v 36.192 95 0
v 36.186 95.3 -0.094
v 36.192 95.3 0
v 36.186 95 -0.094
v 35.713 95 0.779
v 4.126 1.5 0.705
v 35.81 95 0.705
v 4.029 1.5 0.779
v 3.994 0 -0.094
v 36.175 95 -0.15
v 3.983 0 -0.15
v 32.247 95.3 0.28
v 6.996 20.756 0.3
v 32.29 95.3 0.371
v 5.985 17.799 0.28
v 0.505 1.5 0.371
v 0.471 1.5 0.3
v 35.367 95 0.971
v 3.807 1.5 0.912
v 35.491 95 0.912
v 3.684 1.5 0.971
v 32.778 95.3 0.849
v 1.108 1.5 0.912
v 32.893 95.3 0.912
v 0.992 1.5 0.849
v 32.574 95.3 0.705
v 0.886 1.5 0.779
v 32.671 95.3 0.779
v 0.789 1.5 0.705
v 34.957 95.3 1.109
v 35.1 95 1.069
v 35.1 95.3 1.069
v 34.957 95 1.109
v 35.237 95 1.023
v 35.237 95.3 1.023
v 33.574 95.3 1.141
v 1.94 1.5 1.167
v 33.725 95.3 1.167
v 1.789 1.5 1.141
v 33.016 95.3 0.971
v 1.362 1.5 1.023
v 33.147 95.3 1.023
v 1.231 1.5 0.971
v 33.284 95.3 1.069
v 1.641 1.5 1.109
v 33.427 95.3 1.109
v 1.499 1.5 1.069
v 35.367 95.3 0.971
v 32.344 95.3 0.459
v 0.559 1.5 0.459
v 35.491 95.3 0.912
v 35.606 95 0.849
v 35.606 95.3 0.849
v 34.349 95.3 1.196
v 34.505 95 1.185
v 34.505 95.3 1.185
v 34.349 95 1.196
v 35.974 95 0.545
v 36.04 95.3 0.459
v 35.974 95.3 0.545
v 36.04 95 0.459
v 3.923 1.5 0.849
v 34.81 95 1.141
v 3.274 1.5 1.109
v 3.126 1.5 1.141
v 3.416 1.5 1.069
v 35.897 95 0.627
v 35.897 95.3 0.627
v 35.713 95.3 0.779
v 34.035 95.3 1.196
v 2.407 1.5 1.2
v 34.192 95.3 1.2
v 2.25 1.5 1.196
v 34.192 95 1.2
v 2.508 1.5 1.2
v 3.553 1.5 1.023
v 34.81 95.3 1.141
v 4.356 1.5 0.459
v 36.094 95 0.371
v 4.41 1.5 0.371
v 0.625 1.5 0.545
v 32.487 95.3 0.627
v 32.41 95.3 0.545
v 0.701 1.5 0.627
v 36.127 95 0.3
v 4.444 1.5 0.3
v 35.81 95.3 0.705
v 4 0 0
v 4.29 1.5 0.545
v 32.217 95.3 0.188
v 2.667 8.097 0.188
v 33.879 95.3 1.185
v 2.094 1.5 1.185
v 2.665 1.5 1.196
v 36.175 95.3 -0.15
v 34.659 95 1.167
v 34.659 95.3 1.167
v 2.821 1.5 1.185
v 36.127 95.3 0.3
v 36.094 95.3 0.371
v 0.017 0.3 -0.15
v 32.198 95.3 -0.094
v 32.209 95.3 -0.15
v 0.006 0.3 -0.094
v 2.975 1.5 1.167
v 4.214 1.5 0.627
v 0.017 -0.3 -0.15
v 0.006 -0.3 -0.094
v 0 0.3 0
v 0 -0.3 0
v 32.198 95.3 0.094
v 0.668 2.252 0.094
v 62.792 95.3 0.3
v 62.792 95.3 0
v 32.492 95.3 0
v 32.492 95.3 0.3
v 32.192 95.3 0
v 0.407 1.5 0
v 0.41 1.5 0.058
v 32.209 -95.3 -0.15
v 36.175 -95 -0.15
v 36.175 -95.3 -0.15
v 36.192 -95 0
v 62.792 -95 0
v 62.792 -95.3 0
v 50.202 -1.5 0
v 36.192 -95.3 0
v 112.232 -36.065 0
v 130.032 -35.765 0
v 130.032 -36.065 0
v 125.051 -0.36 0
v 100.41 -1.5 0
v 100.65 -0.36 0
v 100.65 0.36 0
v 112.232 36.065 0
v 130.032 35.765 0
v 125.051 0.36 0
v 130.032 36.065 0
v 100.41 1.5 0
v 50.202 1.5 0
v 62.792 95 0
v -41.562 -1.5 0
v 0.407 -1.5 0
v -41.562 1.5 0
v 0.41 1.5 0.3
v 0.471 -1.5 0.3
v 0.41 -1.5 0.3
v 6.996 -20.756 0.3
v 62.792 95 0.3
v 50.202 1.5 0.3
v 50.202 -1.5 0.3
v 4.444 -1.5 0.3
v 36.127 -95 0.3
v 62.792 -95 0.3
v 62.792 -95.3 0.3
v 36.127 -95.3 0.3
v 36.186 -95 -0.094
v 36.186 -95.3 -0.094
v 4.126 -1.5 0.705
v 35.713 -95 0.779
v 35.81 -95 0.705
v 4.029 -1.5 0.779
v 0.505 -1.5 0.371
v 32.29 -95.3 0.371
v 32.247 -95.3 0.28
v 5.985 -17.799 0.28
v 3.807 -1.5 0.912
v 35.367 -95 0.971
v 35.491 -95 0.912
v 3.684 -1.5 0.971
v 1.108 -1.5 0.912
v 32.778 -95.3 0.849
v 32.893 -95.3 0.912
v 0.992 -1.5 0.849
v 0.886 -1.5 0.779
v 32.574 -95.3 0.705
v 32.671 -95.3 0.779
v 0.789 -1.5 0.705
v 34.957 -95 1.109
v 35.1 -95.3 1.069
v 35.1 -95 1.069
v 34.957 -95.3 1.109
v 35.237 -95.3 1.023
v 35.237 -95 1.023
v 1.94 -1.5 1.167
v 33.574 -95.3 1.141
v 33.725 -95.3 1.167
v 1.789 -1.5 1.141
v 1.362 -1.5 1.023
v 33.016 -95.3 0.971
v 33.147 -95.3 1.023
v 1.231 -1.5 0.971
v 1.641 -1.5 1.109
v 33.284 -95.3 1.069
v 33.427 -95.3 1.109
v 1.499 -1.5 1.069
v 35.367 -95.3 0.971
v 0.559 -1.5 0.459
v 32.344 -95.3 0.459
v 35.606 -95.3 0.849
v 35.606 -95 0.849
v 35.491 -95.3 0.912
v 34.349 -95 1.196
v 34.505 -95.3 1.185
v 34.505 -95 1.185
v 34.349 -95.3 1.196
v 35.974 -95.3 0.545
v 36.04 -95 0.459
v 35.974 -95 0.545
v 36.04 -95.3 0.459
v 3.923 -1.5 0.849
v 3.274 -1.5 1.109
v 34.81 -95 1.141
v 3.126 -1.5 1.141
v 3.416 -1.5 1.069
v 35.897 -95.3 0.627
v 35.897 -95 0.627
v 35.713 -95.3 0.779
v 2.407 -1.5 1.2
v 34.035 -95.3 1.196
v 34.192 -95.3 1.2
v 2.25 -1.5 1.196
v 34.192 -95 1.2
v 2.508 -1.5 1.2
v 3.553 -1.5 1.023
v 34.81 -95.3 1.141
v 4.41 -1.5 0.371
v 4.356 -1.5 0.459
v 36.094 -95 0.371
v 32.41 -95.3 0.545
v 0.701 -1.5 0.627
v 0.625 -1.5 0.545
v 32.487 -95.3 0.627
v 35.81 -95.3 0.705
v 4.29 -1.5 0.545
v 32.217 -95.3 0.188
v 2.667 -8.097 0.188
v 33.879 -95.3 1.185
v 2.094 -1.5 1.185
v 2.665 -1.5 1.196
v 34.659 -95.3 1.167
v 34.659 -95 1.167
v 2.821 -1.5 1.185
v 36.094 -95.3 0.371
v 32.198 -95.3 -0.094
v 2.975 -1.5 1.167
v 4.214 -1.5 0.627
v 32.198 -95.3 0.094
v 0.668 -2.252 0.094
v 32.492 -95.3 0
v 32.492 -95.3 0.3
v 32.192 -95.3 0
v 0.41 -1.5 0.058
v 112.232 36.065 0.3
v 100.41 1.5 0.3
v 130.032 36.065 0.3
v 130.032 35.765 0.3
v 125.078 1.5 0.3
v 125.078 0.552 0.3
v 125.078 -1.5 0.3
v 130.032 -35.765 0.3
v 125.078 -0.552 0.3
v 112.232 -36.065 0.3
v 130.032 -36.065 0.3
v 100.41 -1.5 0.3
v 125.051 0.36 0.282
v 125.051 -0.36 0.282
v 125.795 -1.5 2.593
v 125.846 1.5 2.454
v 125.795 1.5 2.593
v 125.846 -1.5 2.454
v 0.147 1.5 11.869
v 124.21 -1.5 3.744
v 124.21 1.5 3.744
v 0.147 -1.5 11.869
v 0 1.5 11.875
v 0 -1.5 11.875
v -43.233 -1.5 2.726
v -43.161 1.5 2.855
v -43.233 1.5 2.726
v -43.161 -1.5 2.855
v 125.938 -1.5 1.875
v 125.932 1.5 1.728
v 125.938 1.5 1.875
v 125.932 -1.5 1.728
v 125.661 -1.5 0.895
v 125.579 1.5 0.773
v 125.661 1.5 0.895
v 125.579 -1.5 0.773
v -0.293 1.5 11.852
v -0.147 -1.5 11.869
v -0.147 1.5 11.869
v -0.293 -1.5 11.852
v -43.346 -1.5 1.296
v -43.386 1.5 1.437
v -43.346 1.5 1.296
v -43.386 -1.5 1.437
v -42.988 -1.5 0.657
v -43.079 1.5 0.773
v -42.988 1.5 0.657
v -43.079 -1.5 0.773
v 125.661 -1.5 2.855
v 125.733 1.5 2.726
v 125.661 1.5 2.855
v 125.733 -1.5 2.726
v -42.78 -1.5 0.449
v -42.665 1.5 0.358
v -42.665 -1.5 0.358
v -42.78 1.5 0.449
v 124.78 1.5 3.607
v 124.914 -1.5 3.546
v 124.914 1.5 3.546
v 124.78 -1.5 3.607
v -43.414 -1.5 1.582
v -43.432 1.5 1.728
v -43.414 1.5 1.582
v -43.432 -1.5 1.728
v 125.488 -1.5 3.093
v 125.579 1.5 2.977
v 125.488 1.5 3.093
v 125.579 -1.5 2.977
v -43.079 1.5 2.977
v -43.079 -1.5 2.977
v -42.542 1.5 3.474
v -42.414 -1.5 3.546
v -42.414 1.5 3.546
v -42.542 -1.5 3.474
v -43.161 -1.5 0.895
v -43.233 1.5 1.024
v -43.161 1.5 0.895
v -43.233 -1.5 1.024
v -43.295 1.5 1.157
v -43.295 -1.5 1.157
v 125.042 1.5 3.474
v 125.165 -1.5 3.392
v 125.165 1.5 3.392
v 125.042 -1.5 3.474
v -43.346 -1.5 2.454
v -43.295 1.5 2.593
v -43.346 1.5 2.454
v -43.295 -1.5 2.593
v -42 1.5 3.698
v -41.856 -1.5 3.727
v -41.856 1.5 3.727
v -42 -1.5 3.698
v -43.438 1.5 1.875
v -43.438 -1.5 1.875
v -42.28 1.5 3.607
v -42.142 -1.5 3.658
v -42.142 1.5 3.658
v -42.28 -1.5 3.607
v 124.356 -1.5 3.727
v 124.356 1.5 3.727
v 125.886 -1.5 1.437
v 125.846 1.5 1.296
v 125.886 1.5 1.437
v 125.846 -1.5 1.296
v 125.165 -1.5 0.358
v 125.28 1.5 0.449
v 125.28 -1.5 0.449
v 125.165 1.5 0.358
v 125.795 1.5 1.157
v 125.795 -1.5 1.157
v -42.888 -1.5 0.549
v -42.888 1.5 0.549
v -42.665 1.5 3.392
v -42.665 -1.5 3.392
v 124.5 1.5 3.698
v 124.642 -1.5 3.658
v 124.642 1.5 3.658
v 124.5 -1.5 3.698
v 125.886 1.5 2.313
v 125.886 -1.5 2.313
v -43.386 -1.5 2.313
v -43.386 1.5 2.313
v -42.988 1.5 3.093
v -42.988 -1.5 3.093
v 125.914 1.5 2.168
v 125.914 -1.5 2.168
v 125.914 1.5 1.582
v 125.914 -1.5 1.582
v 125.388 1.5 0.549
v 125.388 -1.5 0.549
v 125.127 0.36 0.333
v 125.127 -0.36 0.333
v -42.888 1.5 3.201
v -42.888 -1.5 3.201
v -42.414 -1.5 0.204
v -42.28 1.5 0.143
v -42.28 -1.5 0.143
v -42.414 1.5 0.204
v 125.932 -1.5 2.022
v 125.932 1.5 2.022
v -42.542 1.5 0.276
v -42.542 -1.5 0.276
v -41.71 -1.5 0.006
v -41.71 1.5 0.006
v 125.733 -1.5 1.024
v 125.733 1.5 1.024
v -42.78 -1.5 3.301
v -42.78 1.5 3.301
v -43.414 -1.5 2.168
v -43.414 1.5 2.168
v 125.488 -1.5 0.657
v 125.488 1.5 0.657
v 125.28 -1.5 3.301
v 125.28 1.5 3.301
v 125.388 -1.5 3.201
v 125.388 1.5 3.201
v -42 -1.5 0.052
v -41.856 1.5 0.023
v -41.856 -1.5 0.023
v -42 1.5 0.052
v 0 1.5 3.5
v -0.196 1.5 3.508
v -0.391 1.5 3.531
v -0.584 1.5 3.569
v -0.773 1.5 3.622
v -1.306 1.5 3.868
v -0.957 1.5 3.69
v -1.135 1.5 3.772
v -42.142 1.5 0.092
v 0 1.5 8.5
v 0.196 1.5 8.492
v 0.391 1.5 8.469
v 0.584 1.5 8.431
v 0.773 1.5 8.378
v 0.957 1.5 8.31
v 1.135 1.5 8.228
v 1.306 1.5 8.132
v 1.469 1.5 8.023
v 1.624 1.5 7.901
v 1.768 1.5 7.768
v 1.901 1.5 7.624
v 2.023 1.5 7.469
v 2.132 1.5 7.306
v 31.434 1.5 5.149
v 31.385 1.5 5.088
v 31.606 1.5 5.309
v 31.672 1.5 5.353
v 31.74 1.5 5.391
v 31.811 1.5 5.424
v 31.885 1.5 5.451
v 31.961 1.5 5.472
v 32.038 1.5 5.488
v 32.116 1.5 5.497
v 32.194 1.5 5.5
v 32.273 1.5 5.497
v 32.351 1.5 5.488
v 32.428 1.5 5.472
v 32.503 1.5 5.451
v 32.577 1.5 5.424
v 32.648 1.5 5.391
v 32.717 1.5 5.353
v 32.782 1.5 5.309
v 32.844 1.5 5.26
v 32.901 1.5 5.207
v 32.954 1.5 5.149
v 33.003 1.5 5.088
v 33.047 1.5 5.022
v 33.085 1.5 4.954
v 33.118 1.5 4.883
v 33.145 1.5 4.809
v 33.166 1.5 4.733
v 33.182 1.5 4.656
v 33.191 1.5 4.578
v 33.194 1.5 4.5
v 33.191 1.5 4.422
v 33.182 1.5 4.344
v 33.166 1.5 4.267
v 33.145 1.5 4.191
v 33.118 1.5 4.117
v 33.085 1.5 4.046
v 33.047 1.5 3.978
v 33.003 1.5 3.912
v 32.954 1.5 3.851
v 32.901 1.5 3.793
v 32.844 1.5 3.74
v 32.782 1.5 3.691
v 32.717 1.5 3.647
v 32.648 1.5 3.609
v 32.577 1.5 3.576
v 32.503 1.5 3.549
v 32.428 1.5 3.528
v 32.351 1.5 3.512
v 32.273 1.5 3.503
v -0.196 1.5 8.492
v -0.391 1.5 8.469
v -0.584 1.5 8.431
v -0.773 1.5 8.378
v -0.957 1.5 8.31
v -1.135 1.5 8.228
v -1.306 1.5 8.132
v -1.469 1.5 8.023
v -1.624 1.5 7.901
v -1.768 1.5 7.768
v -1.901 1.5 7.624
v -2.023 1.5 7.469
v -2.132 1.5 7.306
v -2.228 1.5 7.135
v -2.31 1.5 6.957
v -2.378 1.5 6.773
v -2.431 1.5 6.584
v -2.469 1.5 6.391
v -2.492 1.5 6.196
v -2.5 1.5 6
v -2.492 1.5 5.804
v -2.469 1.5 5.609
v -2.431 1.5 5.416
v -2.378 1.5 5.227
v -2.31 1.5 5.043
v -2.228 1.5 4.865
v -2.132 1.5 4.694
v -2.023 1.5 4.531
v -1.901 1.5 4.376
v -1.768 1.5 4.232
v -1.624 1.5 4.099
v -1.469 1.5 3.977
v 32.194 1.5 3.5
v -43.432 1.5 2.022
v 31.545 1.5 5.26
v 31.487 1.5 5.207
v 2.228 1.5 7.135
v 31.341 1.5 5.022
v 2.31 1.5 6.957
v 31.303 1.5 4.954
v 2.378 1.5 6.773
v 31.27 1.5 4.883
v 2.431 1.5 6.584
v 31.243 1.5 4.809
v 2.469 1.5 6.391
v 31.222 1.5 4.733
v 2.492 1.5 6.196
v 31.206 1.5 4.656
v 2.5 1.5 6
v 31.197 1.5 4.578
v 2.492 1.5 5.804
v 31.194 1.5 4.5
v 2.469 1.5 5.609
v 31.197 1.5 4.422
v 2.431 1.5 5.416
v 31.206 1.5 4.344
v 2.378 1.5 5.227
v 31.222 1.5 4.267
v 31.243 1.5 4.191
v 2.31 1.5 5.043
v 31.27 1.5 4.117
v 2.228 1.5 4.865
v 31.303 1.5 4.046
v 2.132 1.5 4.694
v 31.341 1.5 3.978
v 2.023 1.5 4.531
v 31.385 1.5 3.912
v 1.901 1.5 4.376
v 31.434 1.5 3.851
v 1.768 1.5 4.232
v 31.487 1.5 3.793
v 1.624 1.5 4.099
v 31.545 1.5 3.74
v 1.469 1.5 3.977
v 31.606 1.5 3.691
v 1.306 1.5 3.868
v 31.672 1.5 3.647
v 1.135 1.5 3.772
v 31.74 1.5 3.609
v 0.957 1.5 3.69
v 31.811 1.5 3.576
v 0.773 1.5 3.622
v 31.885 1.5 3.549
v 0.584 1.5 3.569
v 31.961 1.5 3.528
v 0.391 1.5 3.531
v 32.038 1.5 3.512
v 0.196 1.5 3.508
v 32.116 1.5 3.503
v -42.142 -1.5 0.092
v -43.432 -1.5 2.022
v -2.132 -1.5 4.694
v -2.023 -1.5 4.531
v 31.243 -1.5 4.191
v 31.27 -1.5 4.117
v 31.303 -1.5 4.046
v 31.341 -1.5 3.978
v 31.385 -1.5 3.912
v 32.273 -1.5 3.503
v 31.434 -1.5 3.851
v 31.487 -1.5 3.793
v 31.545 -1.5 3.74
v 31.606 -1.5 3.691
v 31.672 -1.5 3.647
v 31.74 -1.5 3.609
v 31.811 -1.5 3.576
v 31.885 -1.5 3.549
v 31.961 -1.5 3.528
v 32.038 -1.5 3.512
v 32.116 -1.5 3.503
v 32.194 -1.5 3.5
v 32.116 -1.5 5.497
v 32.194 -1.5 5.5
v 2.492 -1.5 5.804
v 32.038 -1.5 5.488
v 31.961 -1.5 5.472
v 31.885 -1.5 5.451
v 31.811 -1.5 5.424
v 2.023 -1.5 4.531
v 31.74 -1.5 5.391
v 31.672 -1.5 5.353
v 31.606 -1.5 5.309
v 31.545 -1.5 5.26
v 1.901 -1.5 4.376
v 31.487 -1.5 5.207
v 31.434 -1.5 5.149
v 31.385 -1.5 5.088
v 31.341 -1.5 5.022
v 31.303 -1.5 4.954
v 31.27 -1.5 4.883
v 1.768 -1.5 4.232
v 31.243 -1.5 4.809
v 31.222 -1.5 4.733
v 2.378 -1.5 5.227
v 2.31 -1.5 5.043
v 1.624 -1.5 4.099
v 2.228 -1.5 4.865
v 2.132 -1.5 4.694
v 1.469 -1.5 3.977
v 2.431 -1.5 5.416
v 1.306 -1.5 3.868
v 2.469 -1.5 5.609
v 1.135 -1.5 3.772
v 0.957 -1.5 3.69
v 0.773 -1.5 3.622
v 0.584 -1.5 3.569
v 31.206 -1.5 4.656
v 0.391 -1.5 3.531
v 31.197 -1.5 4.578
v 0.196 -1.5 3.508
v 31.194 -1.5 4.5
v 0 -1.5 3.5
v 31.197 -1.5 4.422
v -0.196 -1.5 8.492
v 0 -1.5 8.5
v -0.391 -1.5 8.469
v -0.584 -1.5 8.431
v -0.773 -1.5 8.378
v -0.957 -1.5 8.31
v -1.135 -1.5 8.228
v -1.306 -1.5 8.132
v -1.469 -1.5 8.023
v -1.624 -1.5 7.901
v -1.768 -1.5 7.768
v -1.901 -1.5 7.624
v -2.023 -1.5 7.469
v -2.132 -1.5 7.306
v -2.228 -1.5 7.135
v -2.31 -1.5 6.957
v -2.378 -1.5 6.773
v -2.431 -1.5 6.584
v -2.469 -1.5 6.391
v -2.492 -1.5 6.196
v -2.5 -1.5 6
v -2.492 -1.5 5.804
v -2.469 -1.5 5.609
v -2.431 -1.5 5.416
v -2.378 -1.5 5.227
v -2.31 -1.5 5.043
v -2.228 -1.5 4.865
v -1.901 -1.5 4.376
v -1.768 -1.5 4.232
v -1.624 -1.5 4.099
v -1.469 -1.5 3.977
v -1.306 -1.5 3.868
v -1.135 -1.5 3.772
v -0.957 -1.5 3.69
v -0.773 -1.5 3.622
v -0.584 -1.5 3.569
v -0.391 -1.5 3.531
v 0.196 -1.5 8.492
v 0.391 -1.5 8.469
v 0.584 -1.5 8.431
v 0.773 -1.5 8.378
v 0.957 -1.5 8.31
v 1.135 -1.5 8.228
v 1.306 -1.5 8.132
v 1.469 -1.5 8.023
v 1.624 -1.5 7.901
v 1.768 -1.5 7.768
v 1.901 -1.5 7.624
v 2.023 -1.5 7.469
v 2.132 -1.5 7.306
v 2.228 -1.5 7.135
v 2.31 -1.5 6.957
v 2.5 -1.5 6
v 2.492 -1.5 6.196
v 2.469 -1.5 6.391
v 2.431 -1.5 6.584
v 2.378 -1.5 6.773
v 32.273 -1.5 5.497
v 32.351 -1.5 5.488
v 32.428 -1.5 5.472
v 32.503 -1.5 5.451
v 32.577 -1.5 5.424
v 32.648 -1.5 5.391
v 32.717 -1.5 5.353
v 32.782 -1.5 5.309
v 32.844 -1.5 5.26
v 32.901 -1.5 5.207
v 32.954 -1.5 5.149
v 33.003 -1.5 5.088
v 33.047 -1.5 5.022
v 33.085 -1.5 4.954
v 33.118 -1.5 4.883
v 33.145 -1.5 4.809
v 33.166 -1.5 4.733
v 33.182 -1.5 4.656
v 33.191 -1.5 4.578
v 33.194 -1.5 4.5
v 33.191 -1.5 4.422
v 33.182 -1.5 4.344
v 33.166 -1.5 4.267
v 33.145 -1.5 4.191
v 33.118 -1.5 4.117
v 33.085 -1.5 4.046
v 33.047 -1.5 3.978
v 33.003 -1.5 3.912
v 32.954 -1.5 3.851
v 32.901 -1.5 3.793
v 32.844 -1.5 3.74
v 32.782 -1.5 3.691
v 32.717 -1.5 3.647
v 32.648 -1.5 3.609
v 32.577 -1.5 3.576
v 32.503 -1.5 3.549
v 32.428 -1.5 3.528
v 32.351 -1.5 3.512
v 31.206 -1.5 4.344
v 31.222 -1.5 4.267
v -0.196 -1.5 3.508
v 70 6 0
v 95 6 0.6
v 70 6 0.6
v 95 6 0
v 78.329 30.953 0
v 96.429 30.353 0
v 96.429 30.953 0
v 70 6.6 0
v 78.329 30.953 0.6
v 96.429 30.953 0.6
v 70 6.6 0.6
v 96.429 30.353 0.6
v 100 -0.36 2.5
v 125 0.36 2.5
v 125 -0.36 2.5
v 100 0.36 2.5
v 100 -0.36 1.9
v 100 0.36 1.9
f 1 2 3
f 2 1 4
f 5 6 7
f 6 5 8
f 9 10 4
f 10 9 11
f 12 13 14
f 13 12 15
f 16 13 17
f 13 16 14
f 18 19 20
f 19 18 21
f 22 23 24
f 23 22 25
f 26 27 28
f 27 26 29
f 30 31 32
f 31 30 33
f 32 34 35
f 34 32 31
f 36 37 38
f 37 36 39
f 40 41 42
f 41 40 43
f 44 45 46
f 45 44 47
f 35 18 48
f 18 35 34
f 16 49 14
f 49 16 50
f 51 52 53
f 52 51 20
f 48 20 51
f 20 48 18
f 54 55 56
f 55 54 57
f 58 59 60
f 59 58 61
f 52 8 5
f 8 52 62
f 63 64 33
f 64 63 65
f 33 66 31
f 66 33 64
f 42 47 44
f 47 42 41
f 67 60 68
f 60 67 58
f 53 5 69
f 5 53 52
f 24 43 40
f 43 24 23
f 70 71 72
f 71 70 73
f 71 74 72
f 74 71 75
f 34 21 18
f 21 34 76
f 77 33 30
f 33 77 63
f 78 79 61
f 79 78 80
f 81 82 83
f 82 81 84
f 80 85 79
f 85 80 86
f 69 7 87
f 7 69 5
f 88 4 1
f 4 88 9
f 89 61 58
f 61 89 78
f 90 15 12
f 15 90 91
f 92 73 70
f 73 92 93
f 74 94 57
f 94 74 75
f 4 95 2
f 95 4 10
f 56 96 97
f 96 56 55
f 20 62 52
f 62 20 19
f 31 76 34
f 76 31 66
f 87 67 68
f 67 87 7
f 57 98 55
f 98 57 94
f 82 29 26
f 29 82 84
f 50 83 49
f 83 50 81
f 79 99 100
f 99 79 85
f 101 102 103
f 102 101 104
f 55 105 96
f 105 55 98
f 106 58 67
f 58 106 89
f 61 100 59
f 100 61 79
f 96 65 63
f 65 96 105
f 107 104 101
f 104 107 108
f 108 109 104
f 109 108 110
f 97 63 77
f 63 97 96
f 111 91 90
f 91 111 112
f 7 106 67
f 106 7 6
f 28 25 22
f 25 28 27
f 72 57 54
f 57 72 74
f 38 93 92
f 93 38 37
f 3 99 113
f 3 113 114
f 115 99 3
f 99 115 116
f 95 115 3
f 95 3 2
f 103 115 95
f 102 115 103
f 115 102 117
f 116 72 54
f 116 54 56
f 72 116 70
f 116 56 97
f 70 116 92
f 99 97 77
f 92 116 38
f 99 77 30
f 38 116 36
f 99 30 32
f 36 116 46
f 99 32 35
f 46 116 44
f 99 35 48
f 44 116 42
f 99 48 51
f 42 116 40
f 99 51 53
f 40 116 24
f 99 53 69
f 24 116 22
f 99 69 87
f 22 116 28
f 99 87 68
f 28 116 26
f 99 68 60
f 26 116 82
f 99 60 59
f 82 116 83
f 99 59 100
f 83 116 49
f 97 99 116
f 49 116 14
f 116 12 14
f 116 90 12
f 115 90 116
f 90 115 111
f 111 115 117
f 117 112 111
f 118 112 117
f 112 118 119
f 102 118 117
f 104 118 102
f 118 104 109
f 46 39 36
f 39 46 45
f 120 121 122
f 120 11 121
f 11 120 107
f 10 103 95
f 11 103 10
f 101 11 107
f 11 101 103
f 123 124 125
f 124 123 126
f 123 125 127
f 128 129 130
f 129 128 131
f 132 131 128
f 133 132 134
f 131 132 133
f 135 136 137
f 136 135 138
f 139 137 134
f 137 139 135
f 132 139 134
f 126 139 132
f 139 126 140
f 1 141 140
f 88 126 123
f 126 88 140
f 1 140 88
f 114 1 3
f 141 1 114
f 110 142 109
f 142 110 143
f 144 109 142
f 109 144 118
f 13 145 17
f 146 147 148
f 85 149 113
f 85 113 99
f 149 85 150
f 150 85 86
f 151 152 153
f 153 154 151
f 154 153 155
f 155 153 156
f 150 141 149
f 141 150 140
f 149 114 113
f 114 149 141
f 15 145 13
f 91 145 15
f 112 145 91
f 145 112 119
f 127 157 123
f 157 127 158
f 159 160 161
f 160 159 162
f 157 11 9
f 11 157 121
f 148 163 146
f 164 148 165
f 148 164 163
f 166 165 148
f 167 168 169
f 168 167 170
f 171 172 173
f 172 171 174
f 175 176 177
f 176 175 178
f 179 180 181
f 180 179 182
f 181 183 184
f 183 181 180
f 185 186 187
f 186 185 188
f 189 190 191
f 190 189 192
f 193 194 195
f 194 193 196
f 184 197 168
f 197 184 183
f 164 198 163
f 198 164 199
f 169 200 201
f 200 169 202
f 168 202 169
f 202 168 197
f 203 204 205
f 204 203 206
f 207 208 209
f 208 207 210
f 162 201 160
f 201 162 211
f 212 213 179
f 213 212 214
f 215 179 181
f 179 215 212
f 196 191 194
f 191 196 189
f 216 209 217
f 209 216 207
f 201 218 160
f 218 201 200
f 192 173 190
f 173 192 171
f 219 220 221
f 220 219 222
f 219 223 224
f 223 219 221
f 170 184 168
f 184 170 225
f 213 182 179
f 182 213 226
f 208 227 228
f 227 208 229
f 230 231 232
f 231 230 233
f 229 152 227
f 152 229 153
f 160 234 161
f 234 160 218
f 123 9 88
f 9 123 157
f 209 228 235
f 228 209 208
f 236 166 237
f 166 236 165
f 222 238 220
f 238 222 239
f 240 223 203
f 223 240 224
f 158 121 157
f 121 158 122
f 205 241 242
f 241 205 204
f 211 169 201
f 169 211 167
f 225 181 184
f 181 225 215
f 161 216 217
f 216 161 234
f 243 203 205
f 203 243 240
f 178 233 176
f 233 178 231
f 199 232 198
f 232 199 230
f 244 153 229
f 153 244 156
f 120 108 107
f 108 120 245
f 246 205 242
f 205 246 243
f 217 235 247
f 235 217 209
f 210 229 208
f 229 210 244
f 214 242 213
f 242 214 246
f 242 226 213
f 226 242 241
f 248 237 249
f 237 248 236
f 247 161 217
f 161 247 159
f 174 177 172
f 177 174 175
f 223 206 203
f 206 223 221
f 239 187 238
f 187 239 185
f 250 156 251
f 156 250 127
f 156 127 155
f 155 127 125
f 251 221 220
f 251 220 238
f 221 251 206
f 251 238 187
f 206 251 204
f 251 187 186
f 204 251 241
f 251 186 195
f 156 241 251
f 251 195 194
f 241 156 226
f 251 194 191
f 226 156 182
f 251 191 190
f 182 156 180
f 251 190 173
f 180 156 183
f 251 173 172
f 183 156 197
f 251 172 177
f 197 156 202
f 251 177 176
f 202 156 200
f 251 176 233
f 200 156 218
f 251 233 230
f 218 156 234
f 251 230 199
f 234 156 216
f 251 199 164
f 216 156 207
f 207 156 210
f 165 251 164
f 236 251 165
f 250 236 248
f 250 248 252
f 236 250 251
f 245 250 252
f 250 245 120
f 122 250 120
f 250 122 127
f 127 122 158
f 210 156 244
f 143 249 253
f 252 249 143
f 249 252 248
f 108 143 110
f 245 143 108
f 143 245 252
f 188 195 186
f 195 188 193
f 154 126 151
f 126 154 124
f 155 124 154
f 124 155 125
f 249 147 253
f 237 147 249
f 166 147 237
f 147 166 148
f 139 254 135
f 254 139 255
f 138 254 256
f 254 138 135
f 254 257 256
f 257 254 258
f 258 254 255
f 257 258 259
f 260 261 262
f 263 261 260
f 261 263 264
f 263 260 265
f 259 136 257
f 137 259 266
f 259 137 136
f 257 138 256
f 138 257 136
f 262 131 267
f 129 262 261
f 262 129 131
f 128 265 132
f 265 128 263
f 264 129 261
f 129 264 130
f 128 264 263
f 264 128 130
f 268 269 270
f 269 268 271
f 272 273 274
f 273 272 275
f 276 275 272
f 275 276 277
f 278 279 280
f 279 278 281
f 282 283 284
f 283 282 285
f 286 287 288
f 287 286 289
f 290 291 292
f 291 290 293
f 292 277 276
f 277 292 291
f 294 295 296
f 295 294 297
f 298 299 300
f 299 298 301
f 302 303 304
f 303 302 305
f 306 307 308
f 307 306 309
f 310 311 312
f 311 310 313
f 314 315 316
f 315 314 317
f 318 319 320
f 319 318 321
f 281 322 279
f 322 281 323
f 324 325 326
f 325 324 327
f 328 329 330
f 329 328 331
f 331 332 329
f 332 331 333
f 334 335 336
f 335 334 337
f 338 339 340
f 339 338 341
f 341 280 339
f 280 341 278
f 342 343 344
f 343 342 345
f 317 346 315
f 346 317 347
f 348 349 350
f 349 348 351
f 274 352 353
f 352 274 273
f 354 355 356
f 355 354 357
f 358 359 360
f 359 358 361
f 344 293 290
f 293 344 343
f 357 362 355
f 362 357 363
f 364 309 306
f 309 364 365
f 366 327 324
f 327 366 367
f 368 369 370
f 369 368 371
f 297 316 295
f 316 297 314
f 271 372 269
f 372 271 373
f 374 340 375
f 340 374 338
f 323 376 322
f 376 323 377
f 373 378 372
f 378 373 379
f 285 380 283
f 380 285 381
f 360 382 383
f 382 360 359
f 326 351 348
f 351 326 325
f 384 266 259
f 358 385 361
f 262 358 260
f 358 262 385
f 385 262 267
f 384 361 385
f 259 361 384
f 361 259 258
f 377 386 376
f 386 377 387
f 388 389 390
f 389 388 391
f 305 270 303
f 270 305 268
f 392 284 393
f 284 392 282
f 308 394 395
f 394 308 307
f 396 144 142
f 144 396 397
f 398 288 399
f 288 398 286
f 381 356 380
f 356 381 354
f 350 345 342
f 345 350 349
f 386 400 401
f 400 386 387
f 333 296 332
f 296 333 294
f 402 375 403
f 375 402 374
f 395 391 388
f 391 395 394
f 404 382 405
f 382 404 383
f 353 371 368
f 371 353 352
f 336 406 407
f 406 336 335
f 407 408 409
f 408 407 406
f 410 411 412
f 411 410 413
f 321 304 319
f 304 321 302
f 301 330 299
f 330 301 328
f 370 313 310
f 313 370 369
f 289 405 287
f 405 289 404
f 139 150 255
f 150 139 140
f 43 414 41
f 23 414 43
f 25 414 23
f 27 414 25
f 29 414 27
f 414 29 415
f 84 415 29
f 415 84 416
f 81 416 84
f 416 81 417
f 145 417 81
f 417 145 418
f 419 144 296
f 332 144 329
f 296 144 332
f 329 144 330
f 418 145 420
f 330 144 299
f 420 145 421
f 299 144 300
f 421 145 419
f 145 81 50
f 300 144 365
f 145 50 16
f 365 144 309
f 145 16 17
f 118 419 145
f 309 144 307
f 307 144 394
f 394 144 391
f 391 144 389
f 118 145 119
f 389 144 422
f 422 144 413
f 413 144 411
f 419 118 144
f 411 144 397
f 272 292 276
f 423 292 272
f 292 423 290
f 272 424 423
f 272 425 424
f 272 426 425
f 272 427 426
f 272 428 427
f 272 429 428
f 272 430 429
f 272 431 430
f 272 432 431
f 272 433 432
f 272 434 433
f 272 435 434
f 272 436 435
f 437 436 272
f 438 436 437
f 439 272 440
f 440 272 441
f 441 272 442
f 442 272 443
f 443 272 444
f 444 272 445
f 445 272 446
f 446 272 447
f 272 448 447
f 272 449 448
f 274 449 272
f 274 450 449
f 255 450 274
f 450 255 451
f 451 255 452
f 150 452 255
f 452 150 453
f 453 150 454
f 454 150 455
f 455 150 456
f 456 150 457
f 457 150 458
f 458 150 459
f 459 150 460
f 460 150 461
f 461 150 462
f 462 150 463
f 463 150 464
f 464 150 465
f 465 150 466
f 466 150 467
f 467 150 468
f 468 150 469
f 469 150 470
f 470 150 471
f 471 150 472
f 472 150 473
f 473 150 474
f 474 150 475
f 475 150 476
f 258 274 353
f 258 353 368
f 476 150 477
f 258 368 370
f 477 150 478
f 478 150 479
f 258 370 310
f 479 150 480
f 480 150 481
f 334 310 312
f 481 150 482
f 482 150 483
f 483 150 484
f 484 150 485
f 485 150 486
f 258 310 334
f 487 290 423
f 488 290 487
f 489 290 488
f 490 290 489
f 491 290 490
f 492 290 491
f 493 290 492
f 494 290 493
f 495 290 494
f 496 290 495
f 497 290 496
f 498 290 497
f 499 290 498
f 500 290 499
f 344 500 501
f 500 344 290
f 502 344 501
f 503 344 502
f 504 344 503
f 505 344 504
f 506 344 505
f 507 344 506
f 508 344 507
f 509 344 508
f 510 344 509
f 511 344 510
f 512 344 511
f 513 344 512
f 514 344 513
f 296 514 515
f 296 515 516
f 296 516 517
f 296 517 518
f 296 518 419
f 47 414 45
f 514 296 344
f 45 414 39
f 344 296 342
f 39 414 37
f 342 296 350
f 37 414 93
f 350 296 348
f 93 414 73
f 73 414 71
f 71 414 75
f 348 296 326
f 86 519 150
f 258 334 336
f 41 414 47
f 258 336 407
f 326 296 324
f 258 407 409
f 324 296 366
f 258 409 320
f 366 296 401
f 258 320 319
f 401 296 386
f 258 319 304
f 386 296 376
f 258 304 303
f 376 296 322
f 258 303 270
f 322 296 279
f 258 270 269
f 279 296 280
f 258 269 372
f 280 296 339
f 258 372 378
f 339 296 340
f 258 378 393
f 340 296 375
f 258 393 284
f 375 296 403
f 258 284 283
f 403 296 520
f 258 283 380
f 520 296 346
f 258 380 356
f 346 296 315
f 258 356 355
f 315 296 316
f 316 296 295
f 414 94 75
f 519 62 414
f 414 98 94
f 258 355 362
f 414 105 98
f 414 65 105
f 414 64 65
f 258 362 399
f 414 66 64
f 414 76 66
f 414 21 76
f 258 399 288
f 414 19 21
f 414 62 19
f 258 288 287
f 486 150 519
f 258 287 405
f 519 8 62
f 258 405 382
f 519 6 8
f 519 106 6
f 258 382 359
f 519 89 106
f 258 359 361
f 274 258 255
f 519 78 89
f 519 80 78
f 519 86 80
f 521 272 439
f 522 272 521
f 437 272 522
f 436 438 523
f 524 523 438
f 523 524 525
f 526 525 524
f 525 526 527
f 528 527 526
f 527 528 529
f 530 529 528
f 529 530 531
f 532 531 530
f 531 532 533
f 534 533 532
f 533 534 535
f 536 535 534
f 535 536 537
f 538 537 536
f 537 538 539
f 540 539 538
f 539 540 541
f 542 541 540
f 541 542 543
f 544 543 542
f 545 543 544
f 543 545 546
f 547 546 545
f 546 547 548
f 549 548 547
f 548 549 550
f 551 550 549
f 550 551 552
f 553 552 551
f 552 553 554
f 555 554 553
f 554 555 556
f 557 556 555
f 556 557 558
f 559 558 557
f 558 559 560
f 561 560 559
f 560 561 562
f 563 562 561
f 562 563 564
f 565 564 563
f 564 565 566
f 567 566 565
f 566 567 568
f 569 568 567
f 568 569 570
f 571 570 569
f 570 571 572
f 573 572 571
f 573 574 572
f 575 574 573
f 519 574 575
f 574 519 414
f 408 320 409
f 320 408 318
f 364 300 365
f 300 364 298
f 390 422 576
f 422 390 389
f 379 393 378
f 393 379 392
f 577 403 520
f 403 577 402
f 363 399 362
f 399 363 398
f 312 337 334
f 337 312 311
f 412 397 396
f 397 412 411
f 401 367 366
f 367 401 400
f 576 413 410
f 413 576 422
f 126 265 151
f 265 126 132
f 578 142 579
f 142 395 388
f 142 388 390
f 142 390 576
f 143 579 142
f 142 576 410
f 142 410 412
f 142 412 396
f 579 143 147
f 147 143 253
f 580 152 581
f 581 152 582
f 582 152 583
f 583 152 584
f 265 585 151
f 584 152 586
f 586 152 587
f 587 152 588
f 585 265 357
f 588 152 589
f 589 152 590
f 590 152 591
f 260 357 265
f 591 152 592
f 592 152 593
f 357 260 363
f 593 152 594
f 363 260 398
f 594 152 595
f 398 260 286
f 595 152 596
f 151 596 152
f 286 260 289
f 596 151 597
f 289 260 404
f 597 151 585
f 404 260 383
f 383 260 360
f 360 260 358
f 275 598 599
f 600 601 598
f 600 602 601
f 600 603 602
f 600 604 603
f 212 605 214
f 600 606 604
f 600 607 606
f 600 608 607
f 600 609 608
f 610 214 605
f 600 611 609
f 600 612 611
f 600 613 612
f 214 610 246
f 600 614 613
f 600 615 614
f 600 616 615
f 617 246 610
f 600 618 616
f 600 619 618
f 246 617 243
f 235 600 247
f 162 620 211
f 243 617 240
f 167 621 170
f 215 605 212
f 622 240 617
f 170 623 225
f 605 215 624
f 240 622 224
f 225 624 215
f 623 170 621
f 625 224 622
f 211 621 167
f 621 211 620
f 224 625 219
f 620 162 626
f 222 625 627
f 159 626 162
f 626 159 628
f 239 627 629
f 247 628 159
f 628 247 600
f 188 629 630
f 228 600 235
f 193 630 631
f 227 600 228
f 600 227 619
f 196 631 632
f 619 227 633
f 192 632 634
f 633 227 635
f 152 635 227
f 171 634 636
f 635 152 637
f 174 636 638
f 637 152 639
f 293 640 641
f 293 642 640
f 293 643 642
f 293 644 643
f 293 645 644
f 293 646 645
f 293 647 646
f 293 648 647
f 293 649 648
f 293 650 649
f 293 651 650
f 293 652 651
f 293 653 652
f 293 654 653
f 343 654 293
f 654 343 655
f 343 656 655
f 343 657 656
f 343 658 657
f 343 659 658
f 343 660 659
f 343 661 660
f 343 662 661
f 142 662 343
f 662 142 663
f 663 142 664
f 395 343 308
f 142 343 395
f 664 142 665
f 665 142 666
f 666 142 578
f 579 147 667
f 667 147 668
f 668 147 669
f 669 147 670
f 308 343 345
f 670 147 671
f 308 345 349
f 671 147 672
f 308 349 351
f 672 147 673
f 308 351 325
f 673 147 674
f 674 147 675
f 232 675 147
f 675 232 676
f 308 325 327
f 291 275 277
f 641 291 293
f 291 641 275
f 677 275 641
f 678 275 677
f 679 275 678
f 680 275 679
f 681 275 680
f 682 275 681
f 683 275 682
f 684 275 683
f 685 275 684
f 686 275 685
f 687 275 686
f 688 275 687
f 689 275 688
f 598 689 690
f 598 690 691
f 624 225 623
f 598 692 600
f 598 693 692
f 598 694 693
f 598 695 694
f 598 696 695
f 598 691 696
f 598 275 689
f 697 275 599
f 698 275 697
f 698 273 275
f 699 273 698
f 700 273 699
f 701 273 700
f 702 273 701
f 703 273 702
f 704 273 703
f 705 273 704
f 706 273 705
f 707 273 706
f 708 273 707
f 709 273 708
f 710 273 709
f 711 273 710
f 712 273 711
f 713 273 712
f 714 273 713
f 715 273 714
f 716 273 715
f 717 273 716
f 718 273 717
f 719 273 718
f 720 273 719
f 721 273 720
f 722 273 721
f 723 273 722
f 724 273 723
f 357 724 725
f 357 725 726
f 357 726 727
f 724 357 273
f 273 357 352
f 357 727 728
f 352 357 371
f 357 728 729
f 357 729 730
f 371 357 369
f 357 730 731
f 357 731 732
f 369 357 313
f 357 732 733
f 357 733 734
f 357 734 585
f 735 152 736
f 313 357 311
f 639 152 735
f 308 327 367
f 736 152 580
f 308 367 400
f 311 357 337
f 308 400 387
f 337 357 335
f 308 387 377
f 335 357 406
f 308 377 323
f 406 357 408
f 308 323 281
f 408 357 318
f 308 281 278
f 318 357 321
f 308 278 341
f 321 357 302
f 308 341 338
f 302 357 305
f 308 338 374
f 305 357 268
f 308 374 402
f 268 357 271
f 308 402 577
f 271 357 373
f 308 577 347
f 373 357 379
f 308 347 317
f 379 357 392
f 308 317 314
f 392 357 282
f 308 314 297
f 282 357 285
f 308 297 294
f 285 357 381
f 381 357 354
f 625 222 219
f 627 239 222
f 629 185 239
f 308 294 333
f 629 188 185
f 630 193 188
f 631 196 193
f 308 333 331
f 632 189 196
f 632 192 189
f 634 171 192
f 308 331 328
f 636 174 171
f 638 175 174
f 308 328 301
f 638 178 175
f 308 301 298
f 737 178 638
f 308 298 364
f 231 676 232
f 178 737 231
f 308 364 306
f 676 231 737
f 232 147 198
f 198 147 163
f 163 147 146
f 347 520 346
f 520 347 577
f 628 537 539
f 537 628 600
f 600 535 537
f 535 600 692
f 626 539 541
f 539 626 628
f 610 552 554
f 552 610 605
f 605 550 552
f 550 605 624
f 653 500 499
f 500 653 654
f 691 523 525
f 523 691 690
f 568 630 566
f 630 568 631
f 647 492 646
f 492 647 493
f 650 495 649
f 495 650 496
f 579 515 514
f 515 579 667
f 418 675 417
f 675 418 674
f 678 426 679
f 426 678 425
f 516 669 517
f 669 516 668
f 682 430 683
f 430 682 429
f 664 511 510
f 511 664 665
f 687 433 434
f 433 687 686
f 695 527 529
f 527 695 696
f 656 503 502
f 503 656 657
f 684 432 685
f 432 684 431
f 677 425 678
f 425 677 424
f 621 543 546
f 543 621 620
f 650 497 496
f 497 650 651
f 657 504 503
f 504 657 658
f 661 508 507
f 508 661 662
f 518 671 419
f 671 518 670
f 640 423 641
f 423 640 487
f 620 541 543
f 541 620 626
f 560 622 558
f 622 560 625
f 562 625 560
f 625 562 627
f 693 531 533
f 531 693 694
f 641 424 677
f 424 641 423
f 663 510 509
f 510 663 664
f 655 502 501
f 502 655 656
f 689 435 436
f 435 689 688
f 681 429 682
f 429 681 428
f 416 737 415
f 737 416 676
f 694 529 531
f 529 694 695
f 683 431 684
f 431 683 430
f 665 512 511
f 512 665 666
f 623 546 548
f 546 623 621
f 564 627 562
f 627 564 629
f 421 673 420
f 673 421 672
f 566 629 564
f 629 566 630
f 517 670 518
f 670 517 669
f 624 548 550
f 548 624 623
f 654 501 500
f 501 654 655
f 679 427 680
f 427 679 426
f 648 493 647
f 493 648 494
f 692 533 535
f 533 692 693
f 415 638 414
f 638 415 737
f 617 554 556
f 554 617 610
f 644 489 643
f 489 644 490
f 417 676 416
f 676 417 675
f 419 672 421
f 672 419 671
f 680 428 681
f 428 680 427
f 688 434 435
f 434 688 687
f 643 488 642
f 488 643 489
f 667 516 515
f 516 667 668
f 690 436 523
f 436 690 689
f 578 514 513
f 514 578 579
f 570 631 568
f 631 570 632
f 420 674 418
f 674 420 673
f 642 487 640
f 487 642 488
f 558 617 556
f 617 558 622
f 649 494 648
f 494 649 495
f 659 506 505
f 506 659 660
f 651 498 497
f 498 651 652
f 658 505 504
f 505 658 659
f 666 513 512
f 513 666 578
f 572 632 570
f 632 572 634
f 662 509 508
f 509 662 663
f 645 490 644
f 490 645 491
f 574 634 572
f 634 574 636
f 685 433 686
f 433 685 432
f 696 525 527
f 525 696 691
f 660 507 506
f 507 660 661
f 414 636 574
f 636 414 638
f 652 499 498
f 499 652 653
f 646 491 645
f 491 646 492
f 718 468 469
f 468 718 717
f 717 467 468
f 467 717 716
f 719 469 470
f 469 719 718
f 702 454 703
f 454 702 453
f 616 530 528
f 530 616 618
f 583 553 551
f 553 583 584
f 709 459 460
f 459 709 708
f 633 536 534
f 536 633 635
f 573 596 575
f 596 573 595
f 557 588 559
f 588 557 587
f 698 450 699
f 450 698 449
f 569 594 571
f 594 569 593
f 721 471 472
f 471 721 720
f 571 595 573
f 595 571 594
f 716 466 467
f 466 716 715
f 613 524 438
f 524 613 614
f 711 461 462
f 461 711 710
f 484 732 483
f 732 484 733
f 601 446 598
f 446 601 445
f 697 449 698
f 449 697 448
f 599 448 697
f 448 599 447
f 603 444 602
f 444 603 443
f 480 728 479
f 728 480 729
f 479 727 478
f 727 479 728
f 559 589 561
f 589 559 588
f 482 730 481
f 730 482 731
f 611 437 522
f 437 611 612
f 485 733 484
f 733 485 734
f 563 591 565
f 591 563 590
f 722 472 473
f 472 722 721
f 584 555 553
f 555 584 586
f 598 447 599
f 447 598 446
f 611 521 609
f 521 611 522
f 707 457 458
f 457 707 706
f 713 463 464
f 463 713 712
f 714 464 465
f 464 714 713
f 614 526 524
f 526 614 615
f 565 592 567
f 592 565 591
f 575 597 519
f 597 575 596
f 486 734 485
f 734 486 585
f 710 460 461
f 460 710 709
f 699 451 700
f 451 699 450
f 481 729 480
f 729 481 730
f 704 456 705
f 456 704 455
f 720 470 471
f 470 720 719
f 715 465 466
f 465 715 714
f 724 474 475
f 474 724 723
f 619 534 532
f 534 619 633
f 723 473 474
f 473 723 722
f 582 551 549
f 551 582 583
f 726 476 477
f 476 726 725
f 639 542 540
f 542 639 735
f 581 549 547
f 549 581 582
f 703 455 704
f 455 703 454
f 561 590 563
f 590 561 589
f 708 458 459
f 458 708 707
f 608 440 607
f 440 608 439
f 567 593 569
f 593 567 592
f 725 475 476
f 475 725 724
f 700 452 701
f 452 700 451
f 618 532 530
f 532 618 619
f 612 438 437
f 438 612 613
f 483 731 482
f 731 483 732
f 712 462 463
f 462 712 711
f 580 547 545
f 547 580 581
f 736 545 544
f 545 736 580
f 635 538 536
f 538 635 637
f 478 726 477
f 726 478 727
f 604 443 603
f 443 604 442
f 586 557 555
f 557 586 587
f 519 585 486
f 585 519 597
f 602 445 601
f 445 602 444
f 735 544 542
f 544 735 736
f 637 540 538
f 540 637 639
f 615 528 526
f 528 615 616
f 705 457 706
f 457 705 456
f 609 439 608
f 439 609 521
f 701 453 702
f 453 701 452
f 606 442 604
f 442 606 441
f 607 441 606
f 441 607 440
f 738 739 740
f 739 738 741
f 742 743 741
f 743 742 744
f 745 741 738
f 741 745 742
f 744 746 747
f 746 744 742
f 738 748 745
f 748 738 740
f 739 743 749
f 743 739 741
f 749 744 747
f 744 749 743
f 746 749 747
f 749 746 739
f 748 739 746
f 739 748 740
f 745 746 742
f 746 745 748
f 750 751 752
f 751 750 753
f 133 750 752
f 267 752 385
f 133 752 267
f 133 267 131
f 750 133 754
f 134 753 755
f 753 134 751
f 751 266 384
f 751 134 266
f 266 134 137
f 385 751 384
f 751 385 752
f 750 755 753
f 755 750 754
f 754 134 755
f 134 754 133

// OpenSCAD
/*

Jim Gile
Base Model Aircraft Design

-------------------
Calculations from:
https://www.flitetest.com/articles/easy-aircraft-design
https://www.airfieldmodels.com/information_source/math_and_science_of_model_aircraft/formulas/mean_aerodynamic_chord.htm
-------------------
CWL = This value is chosen by the designer. It is the the Cubic Wing Loading (CWL) of the plane.
    Similar aircraft have a range of CWL which dictates their flight abilities:
    0-4 oz/ft^3 = Gliders
    4-7 oz/ft^3 = Trainers
    7-13 oz/ft^3 = Sport/Aerobatic
    13+ oz/ft^3 = Racing
    Depending on what type of plane you are designing, pick a value to use. This will help
    determine the target weight of your plane in oz.
targetWeight = CWL * (wingArea * sqrt(wingArea)). This is the target weight of your palne in ounces.

MAC = Mean Aerodynamic Chord (MAC) or Geometric Mean Chord (GMC). 
        This  is where all the aerodynamic forces act on a wing.
AC =  This is the Aerodynamic Center of a wing. It is the location along cordRoot.
LAC = This value is chosen by the designer and is the fuselage length between the wingAC and the hStabAC

VH = (hStabArea*(LAC - D + SM)) / (wingArea * MAC). This is the Horizontal Stabilizer Volume (VH).
    Typical values for this are between .35 and .8. Where .35 is less effective and .8 is very effective.

D = LAC * (hStabArea/(wingArea+hStabArea))    This is a measurement to help find the Neutral Point (NP).
SM = MAC / ~10      Static Margin should be from 5% to 15% of the MAC Size. 15% being highly stable
NP = This is the Neutral Point of the plane, it  is like the AC of your entire airplane.
CG = NP - SM. This is the center of gravity of the plane (planeCG). 
    The CG must always be foreward of the NP.

LCG = This value is calculated after the CG is chosen by the designer. 
    It is the fuselage length between the planeCG and the vStabAC.
VV = (vStabArea*LCG)/(wingArea*wingSpan). This is the Vertical Stabilizer Volume (VV).
    Typical values for VV are between .02 and .05. Where .05 is a very effective tail.

-------------------
Other calculations from here:
https://www.flitetest.com/articles/Design_Parameters_for_Scratch_Built_Airframes
-------------------

Everything is based off of the Root Cord (cordRoot) of the main wing.
fuselageForeLen = 1 to 1.5 times the Root Cord. This is the length of the fuselage in front of main wing.
    This should be 30 to 35% of fuselageTotLen in front of the CG.
fuselageAftLen = 2 to 2.4 times the Root Cord. This is the length of the fuselage behind the main wing.
    This should be 65 to 70% of fuselageTotLen behind the CG.
fuselageTotLen = fuselageForeLen + cordRoot + fuselageAftLen

-------------------
Other notes:
-------------------
https://www.radiocontrolinfo.com/rc-calculators/rc-airplane-design-calculator/

https://rcplanes.online/cg_calc.htm
    For an aircraft to be stable in pitch, its CG must be forward of the
    Neutral Point NP by a safety factor called the Static Margin, which
    is a percentage of the MAC (Mean Aerodynamic Chord).
    Static Margin should be between 5% and 15% for a good stability.

    Low Static Margin gives less static stability but greater elevator
    authority, whereas a higher Static Margin results in greater static
    stability but reduces elevator authority.
    Too much Static Margin makes the aircraft nose-heavy, which
    may result in elevator stall at take-off and/or landing.
    Whereas a low Static Margin makes the aircraft tail-heavy and
    susceptible to stall at low speed, e. g. during the landing approach.
    * Choose Low Stabilizer Efficiency if the stab is close to the wing's wake
    or behind a fat fuselage in disturbed flow. Choose T-tail for most gliders.

*/

$fn= 80; // Smoothness setting

// --------------------------------
// Constants
// --------------------------------
gramsToOunce = 0.035274;
mmToInch = 0.0393701;
mmToFoot = 0.00328084;
sqMmToSqFeet = 1.07639e-5;

// --------------------------------
// Design Variables
// --------------------------------
// Wing
wingThick = .3;
wingSpan = 190; //Total length of both wings
cordRoot = 50; //Width of wing at the root
taperRatio = .6; //Determines the cord lenght at the tip. Range is 45% to 100%
leadSweepAngle = 20; //Leading edge sweep angle of main wing. Range is 0 to 20 degrees.
dihedralAngle = 12; //Wing dihedral in degrees. 6=Controled, 12=FreeFlight
topWing = true;

//Stabilizer Efficiency (Standard=0.85,TTail=0.95,Low=0.65) 
stabEff = 0.85;    

// Horizontal Stabilizer
hStabSweepAngle = 20;
hStabCordRootPctOfWing = .5;
hStabCordTaperRatio = .7;
hStabAreaPctOfWing = .20;

// Vertical Stabilizer
vStabThick = .6;
vStabSweepAngle = 20;
vStabCordTaperRatio = .7;
vStabAreaPctOfHStab = 5/8;

// Fuselage
fuselageH = cordRoot/10;
fuselageW = 3;
fuselageTaperRatio = .75;
fuselageForeLenPctOfCord = .85;   //Between 1 and 1.5
fuselageAftLenPctOfCord = 1.5;   //Between 2 and 2.4

// --------------------------------
// Calculated Values
// --------------------------------
// Wing
cordTip = cordRoot * taperRatio;
cordSum = cordRoot + cordTip;
wingArea = wingSpan * (cordSum/2);
wingSemiSpan = wingSpan/2;

// H Stab
hStabCordRoot = cordRoot*hStabCordRootPctOfWing;
hStabCordTip = hStabCordRoot*hStabCordTaperRatio;
hStabCordSum = hStabCordRoot+hStabCordTip;
hStabArea = wingArea*hStabAreaPctOfWing;
hStabSpan = hStabArea/(hStabCordSum/2);
hStabSemiSpan = hStabSpan/2;

// V Stab
vStabCordRoot = hStabCordRoot;
vStabCordTip = vStabCordRoot*vStabCordTaperRatio;
vStabCordSum = vStabCordRoot+vStabCordTip;
vStabArea = hStabArea*vStabAreaPctOfHStab;
vStabSpan = vStabArea/(vStabCordSum/2);
vStabSemiSpan = vStabSpan/2;

// Fuselage
fuselageForeL = cordRoot*fuselageForeLenPctOfCord;
fuselageAftL = cordRoot*fuselageAftLenPctOfCord;
fuselageL = fuselageForeL+cordRoot+fuselageAftL;

//Cubic Wing Loading
planeWeightG = 8;
planeWeightOz = planeWeightG*gramsToOunce;
wingAreaSqFeet = (wingArea+hStabArea)*sqMmToSqFeet;
CWL = (planeWeightOz/(wingAreaSqFeet*sqrt(wingAreaSqFeet)));
echo("CWL=",CWL,"planeWeightOz=",planeWeightOz,"wingAreaSqFeet=",wingAreaSqFeet);
targetCWL = 4;
targetWeightOz = (targetCWL*(wingAreaSqFeet*sqrt(wingAreaSqFeet)));
targetWeightG = targetWeightOz/gramsToOunce;
echo("targetCWL=",targetCWL,"targetWeightOz=",targetWeightOz,"targetWeightG=",targetWeightG);

// --------------------------------
// Base rendering code
// --------------------------------
sl = false;
viewMode = "ASSEMBLY"; //"NORMAL" or "ASSEMBLY"
xR = (topWing != true || viewMode == "ASSEMBLY") ? 0 : 180;

rotate([xR,0,0]) {
    difference() {
        union() {
            mainWingAssembly(showLines=sl);
            horizontalStabilizerAssembly(showLines=sl);
            if (topWing && viewMode=="ASSEMBLY") {
                verticalStabilizerAssembly(showLines=false);
            } else {
                verticalStabilizer(showLines=sl);
            }
            fuselageAssembly(showLines=sl);
        }
        // remove slot for vert stab
        if (topWing && viewMode=="ASSEMBLY") {
            translate([0,0,.5]) scale([1,1.2,1]) verticalStabilizer(showLines=false);
        }
    }
    
}


// --------------------------------
// Modules
// --------------------------------
// Render full main wing assembly
module mainWingAssembly(showLines=false) {
    for ( i = [0 , 1 ] ) {
        mirror([0,i,0]) mainWing(showLines);
    }
}

//Render right half of main wing planform
module mainWing(showLines=false) {
    renderHalfPlanform(
        cordRoot, 
        cordTip, 
        wingSemiSpan, 
        leadSweepAngle, 
        wingThick, 
        flat=false, 
        showLines=showLines);
}

// Render full horizontal stabilizer assembly
module horizontalStabilizerAssembly(showLines=false) {
    for ( i = [0 , 1 ] ) {
        mirror([0,i,0]) horizontalStabilizer(showLines);
    }
}

//Render right half of horizontal stabilizer planform
module horizontalStabilizer(showLines=false) {
    translate([fuselageL-fuselageForeL-hStabCordRoot,0,0])
    renderHalfPlanform(
        hStabCordRoot, 
        hStabCordTip, 
        hStabSemiSpan, 
        hStabSweepAngle, 
        wingThick, 
        flat=true, 
        showLines=showLines);
}


//Render vertical stabilizer assembly for top wing
module verticalStabilizerAssembly(showLines=false) {
    topWingIndent = 2;
    x = fuselageL-fuselageForeL-vStabCordRoot;
    y = topWing ? -vStabThick/2 : vStabThick/2;
    span = topWing ? vStabSemiSpan+topWingIndent : vStabSemiSpan;
    translate([-vStabCordRoot-5, fuselageW+5, vStabThick/2])
    rotate([90,0,0])
    verticalStabilizer(showLines=showLines);
}

//Render vertical stabilizer planform
module verticalStabilizer(showLines=false) {
    topWingIndent = 2;
    x = fuselageL-fuselageForeL-vStabCordRoot;
    y = topWing ? -vStabThick/2 : vStabThick/2;
    z = topWing ? topWingIndent : (fuselageH*fuselageTaperRatio)-.1;
    r = topWing ? 270 : 90;
    span = topWing ? vStabSemiSpan+topWingIndent : vStabSemiSpan;
    translate([x, y, z])
    rotate([r,0,0])
    renderHalfPlanform(
        vStabCordRoot, 
        vStabCordTip, 
        span, 
        vStabSweepAngle, 
        vStabThick, 
        flat=true, 
        showLines=showLines);
}


//Render right half of a wing planform
module renderHalfPlanform(cRoot, cTip, span, sweep, thick, flat=false, showLines=false) {
    calcValuesList = calcMacAndAeroCenter(cRoot, cTip, span, sweep, thick);
    cSum = calcValuesList[0];
    cTipX1 = calcValuesList[1];
    cTipX2 = calcValuesList[2];
    edgeLen = calcValuesList[3];
    macSize = calcValuesList[4];
    macY = calcValuesList[5];
    macX = calcValuesList[6];
    aeroCenterX = calcValuesList[7];
    
    // Base planform
    hull() {
        cube(thick);
        translate([cTipX1,span,0])cube(thick);
        translate([cTipX2,span,0])cube(thick);
        translate([cRoot-thick,0,0])cube(thick);
    }
    // Leading edge support/airfoil
    if (!flat) {
        rad = 2;
        yPct = .6;
        x0 = rad;
        x1 = cTipX1+rad-thick;
        difference() {
            // Cylinder Support
            hull() {
                translate([x0,0,0])rotate([-90,0,0])
                    scale([1,yPct,1])cylinder(r=rad,h=thick,center=false);
                translate([x1,span,0])rotate([-90,0,0])
                    scale([1,yPct,1])cylinder(r=rad,h=thick,center=false);
            }
            // Remove bottom of cylinder support
            translate([-2,-2,-5-(thick/2)])cube([cTipX2,span+4,5]);
            // Remove excess at tip
            translate([-cTipX2,span+thick,-1])cube([cTipX2*2,2,5]);
        }
    }
    // Render MAC and AC lines
    if (showLines) {
        z = thick+.5;
        // Calculated MAC or GMC line
        #translate([macX,macY,0])cube([macSize,.1,z]);
//        // Geometric MAC Location 1
//        #hull() {
//            translate([-cTip,0,0])cube([.1,.1,z]);
//            translate([cTipX2+cRoot,span,0])cube([.1,.1,z]);
//        }
//        // Geometric MAC Location 2
//        #hull() {
//            translate([cSum,0,0])cube([.1,.1,z]);
//            translate([cTipX1-cRoot,span,0])cube([.1,.1,z]);
//        }
        // AC Line (Aerodynamic Center)
        #hull() {
            translate([aeroCenterX,0,0])cube([.1,.1,z]);
            translate([aeroCenterX,macY,0])cube([.1,.1,z]);
        }
    }
}

module fuselageAssembly(showLines=false) {
    z = wingThick+.5;
    radCG = fuselageH/2;
    radN = radCG * fuselageTaperRatio;
    radT = radN;
    //xCG = cordRoot/2; //TOD: eed to calualte this!!!!
    xN = -fuselageForeL+radN/2;
    xT = fuselageL-fuselageForeL-radT/2;
    
    wingCalcValuesList = calcMacAndAeroCenter(
        cordRoot, 
        cordTip, 
        wingSemiSpan, 
        leadSweepAngle, 
        wingThick);
    hStabCalcValuesList = calcMacAndAeroCenter(
        hStabCordRoot, 
        hStabCordTip, 
        hStabSemiSpan, 
        hStabSweepAngle, 
        wingThick);
    vStabCalcValuesList = calcMacAndAeroCenter(
        vStabCordRoot, 
        vStabCordTip, 
        vStabSemiSpan, 
        vStabSweepAngle, 
        vStabThick);
        
    wingMacSize = wingCalcValuesList[4];
    wingMacY = wingCalcValuesList[5];
    wingAcX = wingCalcValuesList[7];
    hStabAcX = hStabCalcValuesList[7]+fuselageL-fuselageForeL-hStabCordRoot;
    vStabAcX = vStabCalcValuesList[7]+fuselageL-fuselageForeL-vStabCordRoot;
    LAC = hStabAcX - wingAcX;
    D = LAC * (hStabArea/(wingArea+hStabArea));
    NP = wingAcX + D;
    SM = D/(wingMacSize*2);
    xCG = wingAcX + (D/2);
    LCG = vStabAcX - xCG;
    
    echo("hStabAcX=",hStabAcX,"wingAcX=",wingAcX,"LAC=",LAC,"D=",D,"NP=",NP,"SM=",SM,"wingArea=",wingArea,"hStabArea=",hStabArea, "wingMacSize=",wingMacSize);
    
    // Tail Volumes
    hStabVolume = (hStabArea*(LAC-D+SM))/(wingArea*wingMacSize);
    vStabVolume = (vStabArea*LCG)/(wingArea*wingSpan);
    echo("hStabVolume=",hStabVolume,"vStabVolume=",vStabVolume);
    

    if(showLines) {
        // Neutral Point
        color("blue")
        hull() {
            translate([NP,wingMacY,0])cube([.1,.1,z]);
            translate([NP,-wingMacY,0])cube([.1,.1,z]);
        }
        // Center of Gravity
        color("green")
        hull() {
            translate([xCG,wingMacY,0])cube([.1,.1,z]);
            translate([xCG,-wingMacY,0])cube([.1,.1,z]);
        }
    }

//    difference() {
//        hull() {
//            translate([xN,0,radN])rotate([-90,0,0])
//                cylinder(r=radN,h=fuselageW,center=true);
//            translate([xCG,0,radCG])rotate([-90,0,0])
//                cylinder(r=radCG,h=fuselageW,center=true);
//            translate([xT,0,radT])rotate([-90,0,0])
//                cylinder(r=radT,h=fuselageW,center=true);
//        }
//        // Hole for CG
//        translate([xCG,0,radCG])rotate([-90,0,0])
//            cylinder(r=1,h=fuselageW+2,center=true);
//        // Hole in nose for weight
//        translate([xN+2,0,radN])rotate([-90,0,0])
//            cylinder(r=1,h=fuselageW+2,center=true);
//        // Hole in tail
//        translate([xT-2,0,radT])rotate([-90,0,0])
//            cylinder(r=1,h=fuselageW+2,center=true);
//    }

    difference() {
        hull() {
            translate([xN,0,radN])rotate([-90,0,0])
                cylinder(r=radN,h=fuselageW,center=true);
            translate([0,0,fuselageH*2])rotate([-90,0,0])
                cylinder(r=radN,h=fuselageW,center=true);            
            translate([xT,0,radT])rotate([-90,0,0])
                cylinder(r=radT,h=fuselageW,center=true);
        }
//        // Hole in nose for weight
//        translate([xN+2,0,radN])rotate([-90,0,0])
//            cylinder(r=1,h=fuselageW+2,center=true);
        // Big hole in fuselage
        translate([0,0,fuselageH+1])rotate([-90,0,0])
            cylinder(r=fuselageH/2,h=fuselageW+2,center=true);
        // Hole for CG
        translate([xCG,0,radCG+2])rotate([-90,0,0])
            cylinder(r=1,h=fuselageW+2,center=true);
    }

    
}

// --------------------------------
//Functions
// --------------------------------
function calcMacAndAeroCenter(cRoot, cTip, span, sweep, thick) =
    let(cSum=cRoot+cTip)
    let(cTipX1 = sin(sweep)*span)
    let(cTipX2 = cTipX1 + cTip)
    let(edgeLen = sqrt(pow(span,2) + pow(cTipX1,2)))
    let(macSize = (2/3)*(cSum - (cRoot*cTip/cSum)) + thick)
    let(macY = (1/3)*((cRoot + 2*cTip)/cSum)*span)
    let(macX = (sin(sweep)*macY) - thick/2)
    let(acX = macX + (macSize/4))
    [cSum, cTipX1, cTipX2, edgeLen, macSize, macY, macX, acX];
